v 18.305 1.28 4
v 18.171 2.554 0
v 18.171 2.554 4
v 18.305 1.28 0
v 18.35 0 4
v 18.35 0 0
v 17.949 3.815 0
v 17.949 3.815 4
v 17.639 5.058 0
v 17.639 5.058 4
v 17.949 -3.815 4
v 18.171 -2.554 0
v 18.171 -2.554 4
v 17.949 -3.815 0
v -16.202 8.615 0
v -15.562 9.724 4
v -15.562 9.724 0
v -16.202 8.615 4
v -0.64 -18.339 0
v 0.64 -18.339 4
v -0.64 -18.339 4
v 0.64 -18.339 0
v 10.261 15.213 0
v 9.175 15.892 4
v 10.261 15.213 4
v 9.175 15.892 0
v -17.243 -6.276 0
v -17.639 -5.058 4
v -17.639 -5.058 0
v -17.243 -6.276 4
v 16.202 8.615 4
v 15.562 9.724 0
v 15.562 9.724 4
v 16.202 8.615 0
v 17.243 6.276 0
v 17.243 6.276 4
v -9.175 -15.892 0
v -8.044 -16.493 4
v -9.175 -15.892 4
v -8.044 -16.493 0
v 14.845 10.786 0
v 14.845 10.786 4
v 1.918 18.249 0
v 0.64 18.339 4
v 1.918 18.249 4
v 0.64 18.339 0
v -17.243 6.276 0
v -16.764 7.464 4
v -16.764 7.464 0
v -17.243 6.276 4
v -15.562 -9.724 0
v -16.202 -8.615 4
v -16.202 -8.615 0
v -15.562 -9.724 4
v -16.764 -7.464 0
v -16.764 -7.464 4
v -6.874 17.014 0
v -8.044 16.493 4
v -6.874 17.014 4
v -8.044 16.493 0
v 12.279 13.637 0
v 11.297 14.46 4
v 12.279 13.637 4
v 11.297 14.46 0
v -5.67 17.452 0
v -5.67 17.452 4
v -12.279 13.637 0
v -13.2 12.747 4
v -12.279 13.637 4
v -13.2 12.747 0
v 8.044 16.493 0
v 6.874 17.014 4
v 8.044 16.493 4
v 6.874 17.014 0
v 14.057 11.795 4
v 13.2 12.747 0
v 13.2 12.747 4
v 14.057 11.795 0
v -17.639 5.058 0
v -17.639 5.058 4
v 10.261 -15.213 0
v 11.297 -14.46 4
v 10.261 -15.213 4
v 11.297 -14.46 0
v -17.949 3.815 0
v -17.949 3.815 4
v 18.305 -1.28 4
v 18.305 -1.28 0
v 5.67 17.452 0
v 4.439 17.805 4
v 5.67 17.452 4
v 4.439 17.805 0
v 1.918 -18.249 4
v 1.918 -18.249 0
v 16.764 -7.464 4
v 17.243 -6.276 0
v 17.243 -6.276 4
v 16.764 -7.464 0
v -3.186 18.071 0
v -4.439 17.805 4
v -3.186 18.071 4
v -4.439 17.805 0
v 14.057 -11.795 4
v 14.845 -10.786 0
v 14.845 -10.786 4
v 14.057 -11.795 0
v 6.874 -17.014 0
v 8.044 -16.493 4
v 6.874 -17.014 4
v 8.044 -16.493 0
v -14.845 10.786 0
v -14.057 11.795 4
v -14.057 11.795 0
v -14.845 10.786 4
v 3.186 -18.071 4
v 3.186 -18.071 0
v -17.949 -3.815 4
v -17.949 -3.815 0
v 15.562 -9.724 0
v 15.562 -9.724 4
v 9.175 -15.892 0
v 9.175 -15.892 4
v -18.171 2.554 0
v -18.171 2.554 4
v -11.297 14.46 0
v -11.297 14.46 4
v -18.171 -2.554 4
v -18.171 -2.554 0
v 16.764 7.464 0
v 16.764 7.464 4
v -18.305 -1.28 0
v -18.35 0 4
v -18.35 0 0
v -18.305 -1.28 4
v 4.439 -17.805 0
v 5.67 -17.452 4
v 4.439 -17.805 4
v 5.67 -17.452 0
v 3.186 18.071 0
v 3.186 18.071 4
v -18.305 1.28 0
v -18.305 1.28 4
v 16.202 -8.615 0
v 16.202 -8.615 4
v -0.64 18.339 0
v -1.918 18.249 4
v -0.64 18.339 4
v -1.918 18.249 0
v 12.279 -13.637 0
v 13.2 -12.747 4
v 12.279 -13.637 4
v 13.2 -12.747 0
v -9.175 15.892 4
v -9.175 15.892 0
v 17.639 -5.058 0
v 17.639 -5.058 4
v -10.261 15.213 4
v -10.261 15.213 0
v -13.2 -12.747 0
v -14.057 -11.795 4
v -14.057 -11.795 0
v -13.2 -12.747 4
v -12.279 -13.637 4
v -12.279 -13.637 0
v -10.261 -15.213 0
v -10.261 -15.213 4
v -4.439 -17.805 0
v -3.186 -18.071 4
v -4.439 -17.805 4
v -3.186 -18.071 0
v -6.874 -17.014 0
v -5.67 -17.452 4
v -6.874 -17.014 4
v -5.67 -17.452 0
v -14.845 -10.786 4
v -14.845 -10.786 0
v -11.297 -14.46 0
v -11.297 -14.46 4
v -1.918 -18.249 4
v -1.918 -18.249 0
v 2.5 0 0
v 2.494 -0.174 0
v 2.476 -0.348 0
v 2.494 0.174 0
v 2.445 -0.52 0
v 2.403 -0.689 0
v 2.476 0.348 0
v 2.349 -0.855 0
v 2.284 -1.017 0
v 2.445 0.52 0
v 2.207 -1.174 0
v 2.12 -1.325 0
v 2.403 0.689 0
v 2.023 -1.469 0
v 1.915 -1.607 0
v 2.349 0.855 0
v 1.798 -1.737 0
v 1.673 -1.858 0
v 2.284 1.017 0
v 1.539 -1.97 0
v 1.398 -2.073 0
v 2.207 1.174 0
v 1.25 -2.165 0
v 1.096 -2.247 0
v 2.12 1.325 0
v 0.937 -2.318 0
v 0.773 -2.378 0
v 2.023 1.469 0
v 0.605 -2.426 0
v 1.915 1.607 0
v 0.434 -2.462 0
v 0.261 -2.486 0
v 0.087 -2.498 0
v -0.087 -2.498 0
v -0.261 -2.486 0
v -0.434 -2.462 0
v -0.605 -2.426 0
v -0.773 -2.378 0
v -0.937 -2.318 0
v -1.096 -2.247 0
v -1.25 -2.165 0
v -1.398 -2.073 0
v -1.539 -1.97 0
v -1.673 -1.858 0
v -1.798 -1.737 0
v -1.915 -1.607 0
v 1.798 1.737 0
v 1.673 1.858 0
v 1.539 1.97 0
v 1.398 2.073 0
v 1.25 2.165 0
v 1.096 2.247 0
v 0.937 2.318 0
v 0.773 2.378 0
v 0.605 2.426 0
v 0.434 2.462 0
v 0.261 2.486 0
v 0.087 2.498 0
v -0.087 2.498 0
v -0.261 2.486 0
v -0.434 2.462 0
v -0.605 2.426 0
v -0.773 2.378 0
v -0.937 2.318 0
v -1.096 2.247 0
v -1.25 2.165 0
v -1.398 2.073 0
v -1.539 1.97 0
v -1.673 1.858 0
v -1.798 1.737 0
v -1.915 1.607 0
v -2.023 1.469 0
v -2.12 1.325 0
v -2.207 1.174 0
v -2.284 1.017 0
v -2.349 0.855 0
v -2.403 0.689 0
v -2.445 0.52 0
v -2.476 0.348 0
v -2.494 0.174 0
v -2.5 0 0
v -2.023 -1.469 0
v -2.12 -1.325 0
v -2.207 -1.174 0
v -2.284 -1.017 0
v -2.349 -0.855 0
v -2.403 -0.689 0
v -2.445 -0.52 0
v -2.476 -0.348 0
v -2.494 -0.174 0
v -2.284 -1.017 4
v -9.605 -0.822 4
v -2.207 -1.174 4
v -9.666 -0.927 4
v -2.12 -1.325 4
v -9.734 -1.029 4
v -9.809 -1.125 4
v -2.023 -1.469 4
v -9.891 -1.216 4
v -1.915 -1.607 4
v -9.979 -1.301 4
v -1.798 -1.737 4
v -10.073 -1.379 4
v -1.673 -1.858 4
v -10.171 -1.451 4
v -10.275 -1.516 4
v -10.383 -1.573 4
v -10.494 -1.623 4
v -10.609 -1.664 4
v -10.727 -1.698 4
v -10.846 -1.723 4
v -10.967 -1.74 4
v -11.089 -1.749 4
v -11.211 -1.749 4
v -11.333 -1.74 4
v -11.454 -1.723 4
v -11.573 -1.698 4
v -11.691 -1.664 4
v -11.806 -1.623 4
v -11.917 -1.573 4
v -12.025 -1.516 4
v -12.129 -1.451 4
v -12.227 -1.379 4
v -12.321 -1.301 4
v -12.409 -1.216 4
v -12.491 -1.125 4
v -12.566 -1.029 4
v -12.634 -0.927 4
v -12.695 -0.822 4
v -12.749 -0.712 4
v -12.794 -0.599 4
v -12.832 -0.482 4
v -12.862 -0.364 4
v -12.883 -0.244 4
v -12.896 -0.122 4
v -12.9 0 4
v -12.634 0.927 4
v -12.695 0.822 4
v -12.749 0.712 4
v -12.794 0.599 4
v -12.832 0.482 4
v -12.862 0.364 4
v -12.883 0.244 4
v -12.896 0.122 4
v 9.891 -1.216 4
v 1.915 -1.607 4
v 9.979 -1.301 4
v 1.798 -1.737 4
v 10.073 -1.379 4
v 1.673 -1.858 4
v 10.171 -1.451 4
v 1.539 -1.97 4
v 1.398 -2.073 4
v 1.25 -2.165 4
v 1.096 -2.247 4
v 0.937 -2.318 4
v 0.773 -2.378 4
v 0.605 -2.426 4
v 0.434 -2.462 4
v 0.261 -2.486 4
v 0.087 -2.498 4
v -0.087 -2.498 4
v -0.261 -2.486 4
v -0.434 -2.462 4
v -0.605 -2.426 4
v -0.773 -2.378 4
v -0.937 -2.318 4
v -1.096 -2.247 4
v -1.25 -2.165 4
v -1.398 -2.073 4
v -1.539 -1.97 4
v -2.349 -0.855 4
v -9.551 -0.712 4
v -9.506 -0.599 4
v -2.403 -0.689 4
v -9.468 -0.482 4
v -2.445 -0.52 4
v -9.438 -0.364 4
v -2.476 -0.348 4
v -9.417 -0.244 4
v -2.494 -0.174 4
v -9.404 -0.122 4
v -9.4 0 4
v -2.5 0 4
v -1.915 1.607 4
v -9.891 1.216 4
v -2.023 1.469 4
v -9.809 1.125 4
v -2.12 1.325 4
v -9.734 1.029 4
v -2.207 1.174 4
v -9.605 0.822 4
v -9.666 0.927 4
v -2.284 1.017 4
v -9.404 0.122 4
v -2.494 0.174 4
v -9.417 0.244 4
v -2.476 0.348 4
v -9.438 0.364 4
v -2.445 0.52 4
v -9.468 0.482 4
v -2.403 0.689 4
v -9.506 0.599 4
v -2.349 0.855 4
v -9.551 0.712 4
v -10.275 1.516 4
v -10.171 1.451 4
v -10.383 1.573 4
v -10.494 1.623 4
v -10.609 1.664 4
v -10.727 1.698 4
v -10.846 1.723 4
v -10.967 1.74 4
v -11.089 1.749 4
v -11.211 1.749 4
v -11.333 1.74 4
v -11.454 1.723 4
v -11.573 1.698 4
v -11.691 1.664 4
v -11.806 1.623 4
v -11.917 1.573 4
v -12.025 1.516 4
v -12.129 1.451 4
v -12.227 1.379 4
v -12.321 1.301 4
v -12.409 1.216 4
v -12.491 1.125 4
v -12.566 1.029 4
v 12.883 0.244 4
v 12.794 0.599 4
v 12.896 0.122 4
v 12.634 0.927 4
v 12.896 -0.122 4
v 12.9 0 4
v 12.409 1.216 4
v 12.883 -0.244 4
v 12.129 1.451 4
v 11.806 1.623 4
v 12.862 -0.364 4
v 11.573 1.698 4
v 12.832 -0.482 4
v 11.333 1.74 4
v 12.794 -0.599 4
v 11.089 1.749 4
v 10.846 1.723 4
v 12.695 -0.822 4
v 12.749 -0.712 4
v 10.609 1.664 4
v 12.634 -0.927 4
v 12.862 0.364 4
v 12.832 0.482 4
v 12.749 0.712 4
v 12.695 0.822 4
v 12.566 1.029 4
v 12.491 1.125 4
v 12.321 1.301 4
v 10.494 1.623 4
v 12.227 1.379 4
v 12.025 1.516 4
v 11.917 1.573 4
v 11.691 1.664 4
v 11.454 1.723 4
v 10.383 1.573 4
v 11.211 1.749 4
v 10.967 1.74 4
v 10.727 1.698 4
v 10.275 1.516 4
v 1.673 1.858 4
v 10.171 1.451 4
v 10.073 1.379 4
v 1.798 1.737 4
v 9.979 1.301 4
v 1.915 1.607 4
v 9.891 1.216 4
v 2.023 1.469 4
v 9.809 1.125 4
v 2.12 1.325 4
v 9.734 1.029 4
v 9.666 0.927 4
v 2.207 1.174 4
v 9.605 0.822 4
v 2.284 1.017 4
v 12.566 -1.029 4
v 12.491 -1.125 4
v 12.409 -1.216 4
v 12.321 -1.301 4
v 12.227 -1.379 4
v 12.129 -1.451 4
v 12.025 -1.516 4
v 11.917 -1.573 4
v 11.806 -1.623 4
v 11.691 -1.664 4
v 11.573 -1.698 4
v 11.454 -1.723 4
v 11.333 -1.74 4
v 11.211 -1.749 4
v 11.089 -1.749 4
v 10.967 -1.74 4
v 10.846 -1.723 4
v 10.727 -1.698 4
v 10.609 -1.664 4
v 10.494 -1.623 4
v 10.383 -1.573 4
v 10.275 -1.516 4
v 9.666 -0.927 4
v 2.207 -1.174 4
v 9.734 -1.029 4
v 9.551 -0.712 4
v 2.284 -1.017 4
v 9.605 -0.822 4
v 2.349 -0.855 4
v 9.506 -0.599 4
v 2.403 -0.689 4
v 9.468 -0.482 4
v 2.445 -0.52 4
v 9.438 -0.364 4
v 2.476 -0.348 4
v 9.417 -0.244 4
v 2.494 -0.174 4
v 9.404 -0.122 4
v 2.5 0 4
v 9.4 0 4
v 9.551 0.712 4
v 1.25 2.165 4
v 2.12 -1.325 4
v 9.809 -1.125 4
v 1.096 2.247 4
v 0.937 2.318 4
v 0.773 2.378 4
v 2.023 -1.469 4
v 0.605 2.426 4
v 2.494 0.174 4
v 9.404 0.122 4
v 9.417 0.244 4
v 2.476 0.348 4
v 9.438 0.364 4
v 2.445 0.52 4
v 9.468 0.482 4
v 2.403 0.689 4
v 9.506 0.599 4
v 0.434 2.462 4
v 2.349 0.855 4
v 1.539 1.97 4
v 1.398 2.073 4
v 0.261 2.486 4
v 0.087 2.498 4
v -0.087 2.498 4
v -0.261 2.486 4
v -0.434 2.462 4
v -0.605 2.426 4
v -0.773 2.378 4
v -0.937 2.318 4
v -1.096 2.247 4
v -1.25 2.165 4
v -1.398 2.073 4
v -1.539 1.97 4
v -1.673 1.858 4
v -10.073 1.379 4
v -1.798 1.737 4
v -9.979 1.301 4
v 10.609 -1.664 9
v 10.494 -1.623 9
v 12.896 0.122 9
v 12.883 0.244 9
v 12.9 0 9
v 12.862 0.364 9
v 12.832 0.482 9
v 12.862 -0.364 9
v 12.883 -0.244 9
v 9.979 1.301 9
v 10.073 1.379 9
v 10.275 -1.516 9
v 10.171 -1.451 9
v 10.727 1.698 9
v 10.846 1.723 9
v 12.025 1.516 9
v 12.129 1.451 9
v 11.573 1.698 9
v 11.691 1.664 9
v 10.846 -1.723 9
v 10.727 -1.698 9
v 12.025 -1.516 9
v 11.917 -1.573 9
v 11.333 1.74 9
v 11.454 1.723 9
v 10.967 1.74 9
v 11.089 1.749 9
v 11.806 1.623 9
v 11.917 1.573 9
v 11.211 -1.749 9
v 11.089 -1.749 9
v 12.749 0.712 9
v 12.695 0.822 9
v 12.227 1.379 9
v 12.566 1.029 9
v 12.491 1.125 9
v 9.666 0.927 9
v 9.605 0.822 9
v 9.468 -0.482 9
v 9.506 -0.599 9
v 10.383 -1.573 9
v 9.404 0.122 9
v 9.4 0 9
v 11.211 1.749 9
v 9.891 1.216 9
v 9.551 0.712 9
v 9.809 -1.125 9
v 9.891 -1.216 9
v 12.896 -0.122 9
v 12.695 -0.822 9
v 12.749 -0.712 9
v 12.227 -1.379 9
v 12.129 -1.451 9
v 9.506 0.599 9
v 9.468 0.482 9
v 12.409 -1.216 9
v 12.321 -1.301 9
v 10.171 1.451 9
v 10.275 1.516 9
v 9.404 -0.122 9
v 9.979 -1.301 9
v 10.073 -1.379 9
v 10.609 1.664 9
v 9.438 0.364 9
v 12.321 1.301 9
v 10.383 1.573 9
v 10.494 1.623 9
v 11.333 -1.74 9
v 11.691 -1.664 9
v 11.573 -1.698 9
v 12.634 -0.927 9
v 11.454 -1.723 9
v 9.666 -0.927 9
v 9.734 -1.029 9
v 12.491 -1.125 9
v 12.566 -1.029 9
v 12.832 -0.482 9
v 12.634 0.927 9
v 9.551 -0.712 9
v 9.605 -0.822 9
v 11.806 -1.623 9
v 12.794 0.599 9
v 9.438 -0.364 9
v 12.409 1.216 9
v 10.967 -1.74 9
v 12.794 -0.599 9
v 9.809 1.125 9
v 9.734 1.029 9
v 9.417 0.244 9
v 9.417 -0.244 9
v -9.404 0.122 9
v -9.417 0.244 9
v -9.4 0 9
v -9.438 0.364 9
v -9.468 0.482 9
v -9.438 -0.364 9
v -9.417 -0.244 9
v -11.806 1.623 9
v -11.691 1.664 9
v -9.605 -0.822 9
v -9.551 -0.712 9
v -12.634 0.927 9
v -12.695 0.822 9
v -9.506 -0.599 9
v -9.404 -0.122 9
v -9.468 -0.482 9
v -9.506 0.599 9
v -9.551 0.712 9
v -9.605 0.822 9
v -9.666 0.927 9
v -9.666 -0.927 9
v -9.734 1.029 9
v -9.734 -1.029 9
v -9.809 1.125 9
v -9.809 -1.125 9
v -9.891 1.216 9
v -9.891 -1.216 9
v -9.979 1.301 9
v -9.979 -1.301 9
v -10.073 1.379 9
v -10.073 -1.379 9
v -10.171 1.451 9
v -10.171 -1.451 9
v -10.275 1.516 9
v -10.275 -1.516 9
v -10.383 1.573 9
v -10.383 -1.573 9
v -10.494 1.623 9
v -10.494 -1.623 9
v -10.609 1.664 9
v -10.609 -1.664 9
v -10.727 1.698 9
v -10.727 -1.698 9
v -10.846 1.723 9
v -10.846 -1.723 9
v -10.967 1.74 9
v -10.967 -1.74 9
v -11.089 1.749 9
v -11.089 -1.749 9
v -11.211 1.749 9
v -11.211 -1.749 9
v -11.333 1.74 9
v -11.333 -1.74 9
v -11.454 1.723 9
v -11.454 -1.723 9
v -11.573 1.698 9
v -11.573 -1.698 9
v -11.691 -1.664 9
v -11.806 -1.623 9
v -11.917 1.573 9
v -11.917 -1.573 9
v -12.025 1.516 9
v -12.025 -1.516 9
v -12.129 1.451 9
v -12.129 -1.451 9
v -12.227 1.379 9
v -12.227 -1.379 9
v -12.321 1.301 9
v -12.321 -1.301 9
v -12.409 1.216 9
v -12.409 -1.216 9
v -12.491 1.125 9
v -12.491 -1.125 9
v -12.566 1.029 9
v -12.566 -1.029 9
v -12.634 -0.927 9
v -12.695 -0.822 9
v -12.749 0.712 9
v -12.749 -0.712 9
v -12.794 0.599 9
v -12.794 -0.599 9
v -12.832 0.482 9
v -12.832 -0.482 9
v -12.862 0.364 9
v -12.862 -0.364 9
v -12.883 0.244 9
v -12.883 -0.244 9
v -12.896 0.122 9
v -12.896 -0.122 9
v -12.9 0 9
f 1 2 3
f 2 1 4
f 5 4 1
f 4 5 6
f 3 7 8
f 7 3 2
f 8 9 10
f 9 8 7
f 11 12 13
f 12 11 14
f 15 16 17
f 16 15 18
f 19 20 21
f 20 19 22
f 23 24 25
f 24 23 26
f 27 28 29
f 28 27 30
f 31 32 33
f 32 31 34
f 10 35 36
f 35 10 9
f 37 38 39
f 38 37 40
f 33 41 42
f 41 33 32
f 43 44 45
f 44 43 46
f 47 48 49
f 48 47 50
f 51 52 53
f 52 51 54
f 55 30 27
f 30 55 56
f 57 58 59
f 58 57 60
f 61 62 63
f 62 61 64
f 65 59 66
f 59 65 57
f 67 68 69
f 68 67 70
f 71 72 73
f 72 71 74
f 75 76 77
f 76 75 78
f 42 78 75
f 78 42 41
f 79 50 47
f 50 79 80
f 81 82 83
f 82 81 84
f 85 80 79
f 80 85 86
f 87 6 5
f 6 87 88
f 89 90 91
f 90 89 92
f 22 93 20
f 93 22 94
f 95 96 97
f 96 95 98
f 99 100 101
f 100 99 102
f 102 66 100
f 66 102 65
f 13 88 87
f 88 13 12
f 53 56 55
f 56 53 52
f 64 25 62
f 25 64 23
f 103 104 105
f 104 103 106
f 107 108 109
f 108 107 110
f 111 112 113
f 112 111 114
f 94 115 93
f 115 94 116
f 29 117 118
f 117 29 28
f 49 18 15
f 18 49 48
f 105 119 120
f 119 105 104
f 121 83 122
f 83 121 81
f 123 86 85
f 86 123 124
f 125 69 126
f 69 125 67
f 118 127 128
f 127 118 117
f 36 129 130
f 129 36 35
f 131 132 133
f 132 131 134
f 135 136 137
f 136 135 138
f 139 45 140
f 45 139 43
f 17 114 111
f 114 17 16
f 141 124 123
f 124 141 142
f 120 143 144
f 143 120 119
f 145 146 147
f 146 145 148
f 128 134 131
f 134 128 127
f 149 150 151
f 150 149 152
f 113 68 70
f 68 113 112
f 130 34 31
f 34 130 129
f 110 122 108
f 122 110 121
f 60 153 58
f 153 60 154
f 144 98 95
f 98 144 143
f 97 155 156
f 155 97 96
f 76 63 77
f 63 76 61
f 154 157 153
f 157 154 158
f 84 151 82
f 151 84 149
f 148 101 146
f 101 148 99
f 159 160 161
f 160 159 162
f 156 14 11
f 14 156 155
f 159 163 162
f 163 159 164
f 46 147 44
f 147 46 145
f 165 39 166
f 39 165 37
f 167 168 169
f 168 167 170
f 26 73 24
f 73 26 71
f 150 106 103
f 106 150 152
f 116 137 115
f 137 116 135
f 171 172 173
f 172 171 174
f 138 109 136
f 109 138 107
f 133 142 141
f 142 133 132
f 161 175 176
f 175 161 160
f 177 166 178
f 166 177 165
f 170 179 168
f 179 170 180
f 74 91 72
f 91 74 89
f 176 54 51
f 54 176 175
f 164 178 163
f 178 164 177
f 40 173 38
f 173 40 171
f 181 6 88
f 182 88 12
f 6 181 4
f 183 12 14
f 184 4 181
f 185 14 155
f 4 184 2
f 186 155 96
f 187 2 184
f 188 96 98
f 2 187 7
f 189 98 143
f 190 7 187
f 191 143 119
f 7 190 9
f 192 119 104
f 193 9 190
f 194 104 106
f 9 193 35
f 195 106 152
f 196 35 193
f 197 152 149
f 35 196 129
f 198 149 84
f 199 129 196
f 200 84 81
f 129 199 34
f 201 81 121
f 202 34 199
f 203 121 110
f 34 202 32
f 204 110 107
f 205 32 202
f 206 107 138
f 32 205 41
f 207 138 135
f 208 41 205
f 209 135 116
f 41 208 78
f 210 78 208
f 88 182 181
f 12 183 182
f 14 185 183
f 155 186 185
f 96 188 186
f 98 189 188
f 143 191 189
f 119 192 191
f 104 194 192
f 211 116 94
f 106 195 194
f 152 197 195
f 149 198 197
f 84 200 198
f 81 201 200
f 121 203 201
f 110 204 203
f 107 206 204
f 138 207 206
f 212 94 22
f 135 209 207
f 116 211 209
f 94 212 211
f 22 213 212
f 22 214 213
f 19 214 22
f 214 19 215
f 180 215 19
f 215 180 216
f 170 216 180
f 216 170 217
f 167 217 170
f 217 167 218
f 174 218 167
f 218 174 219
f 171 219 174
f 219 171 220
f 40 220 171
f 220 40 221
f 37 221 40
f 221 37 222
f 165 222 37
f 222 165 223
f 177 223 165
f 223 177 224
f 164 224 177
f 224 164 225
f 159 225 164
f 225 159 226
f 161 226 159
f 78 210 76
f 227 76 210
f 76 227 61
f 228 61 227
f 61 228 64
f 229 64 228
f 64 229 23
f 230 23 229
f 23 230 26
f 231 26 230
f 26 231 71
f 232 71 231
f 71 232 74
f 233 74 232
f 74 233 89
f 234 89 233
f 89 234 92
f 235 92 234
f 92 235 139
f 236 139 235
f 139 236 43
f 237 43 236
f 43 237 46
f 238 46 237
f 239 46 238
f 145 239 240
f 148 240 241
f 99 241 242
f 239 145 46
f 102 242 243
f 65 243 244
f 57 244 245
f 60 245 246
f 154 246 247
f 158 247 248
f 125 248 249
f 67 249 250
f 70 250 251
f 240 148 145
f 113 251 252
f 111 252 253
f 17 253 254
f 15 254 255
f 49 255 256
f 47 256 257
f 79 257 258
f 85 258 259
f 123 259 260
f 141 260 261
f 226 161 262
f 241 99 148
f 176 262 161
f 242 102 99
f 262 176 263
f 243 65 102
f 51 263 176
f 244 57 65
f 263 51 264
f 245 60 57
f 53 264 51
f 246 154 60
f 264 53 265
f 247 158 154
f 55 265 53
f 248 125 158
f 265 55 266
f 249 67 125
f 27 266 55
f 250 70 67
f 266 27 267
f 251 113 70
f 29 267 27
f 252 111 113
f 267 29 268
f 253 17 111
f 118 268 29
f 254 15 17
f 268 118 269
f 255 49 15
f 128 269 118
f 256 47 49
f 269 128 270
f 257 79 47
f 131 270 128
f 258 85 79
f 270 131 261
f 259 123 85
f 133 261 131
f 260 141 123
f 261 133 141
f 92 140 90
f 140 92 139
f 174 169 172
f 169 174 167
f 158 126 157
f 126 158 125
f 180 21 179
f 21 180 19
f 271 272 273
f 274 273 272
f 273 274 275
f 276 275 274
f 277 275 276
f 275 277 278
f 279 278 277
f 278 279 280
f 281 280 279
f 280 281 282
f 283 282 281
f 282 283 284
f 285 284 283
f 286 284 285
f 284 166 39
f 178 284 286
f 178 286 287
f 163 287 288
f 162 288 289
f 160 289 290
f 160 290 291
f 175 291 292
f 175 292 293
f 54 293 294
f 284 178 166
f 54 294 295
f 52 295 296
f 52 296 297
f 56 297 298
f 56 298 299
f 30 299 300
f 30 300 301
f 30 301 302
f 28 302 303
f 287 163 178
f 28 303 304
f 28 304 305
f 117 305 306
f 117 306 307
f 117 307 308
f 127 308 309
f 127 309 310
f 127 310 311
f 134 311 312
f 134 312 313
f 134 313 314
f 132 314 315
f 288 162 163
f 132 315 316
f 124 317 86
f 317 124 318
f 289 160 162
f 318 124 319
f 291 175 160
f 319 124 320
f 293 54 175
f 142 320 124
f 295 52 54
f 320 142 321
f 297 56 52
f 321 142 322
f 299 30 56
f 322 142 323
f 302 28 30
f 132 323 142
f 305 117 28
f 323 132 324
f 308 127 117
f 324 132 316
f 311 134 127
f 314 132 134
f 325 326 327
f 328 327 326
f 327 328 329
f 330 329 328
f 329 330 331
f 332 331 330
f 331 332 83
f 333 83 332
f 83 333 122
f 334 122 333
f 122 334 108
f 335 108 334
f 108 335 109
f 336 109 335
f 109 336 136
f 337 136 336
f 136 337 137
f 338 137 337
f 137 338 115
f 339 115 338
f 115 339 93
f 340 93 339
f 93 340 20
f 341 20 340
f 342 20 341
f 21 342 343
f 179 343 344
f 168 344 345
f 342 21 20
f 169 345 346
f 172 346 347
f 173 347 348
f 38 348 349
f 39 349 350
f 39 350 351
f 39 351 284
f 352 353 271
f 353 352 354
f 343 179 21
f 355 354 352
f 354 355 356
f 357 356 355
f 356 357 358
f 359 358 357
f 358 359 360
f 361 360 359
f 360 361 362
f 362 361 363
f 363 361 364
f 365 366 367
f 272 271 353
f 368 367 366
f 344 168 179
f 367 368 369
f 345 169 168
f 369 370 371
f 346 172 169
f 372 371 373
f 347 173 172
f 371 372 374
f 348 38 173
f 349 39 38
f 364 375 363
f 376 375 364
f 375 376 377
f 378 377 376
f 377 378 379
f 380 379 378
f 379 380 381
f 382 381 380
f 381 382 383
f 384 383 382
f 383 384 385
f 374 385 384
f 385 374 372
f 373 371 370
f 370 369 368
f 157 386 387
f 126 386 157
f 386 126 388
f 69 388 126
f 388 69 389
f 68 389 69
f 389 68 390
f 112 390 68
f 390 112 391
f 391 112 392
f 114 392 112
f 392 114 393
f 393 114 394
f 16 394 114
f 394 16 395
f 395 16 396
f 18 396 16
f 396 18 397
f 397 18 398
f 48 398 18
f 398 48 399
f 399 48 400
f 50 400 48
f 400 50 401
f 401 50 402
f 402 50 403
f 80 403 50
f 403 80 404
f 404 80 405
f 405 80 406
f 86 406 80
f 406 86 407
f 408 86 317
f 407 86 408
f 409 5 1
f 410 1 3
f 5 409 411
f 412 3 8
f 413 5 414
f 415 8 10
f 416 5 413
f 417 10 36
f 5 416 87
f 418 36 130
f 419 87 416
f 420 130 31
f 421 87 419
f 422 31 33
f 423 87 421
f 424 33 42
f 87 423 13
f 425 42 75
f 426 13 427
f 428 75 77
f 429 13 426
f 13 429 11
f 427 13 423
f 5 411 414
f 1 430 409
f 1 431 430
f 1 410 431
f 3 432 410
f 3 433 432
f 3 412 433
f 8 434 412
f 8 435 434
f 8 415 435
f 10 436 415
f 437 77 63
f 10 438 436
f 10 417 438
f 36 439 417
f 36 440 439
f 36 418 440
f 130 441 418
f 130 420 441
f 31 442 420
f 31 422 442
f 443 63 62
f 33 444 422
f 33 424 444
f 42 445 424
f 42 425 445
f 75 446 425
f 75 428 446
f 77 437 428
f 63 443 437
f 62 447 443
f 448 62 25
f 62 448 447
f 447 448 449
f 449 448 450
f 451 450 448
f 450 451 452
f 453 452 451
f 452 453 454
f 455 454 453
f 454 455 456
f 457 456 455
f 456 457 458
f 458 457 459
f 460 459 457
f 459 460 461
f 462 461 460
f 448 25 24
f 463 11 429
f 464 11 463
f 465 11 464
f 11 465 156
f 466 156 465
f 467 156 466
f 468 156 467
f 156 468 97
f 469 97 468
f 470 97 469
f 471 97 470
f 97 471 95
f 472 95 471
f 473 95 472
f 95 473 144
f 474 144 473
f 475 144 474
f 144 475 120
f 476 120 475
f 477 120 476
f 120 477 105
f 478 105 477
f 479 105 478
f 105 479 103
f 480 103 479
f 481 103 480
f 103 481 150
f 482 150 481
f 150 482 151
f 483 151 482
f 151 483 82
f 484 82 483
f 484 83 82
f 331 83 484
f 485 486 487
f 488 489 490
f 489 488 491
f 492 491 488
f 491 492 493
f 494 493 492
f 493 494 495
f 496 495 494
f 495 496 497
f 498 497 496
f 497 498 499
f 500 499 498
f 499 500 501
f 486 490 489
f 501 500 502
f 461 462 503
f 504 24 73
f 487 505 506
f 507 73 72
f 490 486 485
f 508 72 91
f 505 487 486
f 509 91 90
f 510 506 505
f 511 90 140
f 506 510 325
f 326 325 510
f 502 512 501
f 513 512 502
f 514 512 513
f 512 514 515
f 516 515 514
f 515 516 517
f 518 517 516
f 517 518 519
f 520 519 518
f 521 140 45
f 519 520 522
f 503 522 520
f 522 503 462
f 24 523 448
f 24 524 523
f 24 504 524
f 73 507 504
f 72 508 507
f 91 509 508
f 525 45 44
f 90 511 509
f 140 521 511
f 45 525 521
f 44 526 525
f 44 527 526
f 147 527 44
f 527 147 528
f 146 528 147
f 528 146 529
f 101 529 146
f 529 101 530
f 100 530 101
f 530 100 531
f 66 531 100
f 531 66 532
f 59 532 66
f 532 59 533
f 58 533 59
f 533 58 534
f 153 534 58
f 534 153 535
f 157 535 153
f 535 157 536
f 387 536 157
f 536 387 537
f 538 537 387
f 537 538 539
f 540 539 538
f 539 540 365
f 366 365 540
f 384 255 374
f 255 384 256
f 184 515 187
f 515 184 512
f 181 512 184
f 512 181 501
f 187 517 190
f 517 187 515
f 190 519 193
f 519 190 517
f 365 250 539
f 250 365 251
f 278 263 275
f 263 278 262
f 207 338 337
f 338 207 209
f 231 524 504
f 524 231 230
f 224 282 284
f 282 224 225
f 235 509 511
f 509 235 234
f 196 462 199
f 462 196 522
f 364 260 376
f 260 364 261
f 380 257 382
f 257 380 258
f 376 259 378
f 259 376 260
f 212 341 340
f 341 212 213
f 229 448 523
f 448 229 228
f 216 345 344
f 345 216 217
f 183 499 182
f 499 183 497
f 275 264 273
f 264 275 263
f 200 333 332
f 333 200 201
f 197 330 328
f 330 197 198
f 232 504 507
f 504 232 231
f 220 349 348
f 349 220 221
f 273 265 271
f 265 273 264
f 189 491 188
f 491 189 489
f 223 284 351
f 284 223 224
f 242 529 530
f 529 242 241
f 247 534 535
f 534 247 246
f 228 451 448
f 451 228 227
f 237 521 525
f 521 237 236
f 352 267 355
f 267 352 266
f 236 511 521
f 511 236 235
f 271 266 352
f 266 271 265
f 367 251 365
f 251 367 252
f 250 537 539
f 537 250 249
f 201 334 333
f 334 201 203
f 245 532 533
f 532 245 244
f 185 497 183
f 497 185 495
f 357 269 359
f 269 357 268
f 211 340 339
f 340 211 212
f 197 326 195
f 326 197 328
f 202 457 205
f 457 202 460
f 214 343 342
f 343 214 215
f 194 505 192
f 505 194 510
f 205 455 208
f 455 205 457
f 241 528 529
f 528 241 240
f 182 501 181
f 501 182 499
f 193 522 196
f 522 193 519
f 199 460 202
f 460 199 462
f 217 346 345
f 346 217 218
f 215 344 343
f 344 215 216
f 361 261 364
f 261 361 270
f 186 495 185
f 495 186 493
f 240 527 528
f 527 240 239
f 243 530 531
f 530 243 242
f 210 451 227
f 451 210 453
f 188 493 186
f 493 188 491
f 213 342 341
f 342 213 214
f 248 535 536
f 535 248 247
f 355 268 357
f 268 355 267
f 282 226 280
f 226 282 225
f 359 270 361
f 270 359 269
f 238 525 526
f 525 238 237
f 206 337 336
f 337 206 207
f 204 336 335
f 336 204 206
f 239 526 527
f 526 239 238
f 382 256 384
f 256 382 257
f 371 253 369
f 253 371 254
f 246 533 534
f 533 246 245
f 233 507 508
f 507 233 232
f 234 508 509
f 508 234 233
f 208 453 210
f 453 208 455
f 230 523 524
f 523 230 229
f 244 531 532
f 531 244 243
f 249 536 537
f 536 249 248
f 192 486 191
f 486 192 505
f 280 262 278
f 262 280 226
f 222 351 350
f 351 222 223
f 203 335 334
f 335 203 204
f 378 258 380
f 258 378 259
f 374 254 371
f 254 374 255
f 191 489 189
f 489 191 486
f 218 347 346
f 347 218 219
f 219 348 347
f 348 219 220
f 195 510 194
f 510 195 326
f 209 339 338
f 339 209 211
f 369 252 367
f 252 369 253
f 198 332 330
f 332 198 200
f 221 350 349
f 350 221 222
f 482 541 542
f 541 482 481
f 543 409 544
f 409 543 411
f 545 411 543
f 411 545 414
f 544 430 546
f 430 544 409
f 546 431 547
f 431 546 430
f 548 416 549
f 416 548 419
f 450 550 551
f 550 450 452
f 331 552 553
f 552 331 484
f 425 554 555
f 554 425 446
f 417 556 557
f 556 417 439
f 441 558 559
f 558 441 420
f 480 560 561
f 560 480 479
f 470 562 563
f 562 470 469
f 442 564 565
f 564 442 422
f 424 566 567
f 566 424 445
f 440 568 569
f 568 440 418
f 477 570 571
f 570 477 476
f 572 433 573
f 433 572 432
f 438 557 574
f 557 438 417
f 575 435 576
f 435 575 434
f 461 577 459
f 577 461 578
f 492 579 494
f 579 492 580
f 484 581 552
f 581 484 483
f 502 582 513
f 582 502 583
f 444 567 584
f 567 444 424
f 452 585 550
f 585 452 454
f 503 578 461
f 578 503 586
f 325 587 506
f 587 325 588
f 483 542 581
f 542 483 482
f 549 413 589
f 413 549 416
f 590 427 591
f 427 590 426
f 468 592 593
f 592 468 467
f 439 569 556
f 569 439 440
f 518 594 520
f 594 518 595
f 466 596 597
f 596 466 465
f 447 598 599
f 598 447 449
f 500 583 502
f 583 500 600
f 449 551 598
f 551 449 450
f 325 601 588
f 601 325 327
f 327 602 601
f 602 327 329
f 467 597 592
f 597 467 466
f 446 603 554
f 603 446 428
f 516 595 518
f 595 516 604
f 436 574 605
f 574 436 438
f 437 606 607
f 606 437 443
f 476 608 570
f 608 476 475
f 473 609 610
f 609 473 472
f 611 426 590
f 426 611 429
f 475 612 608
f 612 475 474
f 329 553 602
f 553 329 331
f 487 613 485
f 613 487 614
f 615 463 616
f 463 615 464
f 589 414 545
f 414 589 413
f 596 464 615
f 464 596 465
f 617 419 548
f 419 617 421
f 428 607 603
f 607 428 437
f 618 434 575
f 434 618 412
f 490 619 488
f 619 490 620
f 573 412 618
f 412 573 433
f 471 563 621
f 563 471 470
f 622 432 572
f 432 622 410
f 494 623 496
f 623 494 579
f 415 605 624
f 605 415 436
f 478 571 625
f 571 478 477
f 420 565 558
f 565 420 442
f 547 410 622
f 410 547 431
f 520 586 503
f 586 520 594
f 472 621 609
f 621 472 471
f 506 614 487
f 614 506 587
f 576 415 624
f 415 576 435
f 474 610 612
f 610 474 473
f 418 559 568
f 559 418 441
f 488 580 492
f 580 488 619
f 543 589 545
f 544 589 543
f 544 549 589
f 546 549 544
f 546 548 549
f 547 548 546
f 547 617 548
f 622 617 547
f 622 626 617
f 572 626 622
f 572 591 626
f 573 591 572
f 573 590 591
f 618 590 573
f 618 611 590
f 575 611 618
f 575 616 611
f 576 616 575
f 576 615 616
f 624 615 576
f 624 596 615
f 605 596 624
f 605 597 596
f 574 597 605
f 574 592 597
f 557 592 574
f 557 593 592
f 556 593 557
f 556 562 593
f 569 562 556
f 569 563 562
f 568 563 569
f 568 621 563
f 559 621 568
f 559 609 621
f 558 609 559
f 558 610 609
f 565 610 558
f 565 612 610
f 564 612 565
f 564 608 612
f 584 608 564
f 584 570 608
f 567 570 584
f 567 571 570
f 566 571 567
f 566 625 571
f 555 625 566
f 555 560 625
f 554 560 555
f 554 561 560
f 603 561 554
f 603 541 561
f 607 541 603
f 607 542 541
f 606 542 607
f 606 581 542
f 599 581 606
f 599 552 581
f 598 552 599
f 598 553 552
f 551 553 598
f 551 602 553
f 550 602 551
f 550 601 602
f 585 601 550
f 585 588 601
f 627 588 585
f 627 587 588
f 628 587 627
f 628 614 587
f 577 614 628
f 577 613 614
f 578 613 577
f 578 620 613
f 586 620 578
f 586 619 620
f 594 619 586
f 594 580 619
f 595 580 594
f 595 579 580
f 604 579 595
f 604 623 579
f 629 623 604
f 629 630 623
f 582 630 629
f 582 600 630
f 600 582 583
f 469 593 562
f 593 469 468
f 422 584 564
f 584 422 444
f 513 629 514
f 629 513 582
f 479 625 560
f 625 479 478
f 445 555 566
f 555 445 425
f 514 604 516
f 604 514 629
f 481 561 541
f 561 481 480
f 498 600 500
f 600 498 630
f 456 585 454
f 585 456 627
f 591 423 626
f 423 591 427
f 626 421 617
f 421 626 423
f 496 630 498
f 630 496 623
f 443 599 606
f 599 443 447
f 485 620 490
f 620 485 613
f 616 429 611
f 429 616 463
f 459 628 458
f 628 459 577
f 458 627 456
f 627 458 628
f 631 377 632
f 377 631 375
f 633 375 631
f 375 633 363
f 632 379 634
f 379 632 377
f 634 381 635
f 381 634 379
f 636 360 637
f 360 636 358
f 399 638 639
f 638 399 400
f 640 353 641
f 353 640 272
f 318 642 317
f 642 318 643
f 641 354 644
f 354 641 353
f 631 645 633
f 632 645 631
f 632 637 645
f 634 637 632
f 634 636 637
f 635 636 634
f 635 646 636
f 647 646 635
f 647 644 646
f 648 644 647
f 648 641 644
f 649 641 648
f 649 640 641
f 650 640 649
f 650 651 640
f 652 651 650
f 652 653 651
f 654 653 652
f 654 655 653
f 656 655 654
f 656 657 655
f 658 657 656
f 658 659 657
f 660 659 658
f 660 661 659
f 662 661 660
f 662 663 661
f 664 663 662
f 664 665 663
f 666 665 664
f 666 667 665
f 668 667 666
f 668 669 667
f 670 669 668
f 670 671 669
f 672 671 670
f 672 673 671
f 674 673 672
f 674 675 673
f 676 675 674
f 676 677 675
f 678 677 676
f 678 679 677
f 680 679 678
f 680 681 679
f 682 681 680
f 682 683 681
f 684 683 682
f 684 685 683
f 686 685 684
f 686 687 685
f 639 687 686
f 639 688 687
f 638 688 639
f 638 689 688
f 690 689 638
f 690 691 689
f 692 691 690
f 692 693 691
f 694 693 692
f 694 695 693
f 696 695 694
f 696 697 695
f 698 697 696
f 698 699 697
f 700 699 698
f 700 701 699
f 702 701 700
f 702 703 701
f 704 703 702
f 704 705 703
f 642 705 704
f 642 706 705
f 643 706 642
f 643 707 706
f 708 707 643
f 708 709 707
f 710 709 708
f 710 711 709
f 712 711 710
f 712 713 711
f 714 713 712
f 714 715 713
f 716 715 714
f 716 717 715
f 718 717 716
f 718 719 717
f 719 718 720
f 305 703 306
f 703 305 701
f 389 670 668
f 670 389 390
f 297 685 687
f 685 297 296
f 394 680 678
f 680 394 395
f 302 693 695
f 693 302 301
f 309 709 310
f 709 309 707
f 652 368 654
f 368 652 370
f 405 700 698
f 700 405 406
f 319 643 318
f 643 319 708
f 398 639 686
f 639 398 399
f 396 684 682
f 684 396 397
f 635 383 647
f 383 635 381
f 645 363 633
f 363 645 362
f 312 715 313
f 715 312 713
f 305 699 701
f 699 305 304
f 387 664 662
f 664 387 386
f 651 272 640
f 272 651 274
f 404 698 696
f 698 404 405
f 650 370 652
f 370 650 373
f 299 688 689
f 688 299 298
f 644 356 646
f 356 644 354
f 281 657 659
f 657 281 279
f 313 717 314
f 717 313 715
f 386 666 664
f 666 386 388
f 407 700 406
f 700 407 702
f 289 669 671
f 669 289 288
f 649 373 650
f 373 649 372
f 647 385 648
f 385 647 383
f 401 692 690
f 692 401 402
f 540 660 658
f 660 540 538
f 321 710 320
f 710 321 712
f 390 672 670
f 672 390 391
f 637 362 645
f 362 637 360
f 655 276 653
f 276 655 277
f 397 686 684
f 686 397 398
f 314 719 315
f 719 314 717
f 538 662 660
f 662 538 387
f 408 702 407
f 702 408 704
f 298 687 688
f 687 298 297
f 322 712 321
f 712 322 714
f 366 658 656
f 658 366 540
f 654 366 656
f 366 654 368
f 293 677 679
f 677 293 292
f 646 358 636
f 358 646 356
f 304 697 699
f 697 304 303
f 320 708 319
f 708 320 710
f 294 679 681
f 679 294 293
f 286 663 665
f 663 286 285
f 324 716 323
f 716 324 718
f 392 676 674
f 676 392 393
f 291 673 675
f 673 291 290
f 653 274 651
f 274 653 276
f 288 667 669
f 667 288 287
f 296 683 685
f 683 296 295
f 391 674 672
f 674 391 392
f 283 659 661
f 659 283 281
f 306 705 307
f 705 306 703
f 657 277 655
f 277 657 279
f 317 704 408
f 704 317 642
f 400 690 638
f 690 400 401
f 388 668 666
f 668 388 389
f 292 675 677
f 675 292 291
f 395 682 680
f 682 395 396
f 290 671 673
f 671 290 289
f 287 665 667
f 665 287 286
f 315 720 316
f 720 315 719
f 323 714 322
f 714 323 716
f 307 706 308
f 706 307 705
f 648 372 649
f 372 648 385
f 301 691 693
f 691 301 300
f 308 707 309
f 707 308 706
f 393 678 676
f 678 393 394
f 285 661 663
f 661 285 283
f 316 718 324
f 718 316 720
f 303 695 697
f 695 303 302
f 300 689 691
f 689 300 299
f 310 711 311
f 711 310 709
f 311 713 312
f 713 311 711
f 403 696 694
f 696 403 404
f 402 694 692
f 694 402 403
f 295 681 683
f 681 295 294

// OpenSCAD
// spindle.scad - thumbturn spindle on main Switchbot Lock unit
// Andrew Ho <andrew@zeuscat.com>

// Measured dimensions
spindle_diameter      = 36.7;   // OD of outermost (closest to lock) plate
spindle_height        =  4.0;   // Height/thickness of outermost plate
spindle_hole_diameter =  5.0;   // ID of center hole where thumbturn snaps into
spindle_post_diameter =  3.5;   // OD of post protrusions stabilizing thumbturn
spindle_post_height   =  5;     // Very approximate post height

// Approximately measured distance between inner/outer edges of posts
spindle_post_inner_distance = 22.3;  // 22.1 according to outer distance
spindle_post_outer_distance = 29.1;  // 29.3 according to inner distance

// Rendering parameters
$fn = 90;
e = 0.1;
e2 = e * 2;

module spindle() {
  module post() {
    cylinder(d = spindle_post_diameter, h = spindle_post_height);
  }
  difference() {
    cylinder(d = spindle_diameter, h = spindle_height);
    translate([0, 0, -e]) cylinder(d = spindle_hole_diameter, h = spindle_height + e2);
  }
  translate([0, 0, spindle_height]) {
    translate([ spindle_post_inner_distance / 2, 0, 0]) post();
    translate([-spindle_post_inner_distance / 2, 0, 0]) post();
  }
}

spindle();
